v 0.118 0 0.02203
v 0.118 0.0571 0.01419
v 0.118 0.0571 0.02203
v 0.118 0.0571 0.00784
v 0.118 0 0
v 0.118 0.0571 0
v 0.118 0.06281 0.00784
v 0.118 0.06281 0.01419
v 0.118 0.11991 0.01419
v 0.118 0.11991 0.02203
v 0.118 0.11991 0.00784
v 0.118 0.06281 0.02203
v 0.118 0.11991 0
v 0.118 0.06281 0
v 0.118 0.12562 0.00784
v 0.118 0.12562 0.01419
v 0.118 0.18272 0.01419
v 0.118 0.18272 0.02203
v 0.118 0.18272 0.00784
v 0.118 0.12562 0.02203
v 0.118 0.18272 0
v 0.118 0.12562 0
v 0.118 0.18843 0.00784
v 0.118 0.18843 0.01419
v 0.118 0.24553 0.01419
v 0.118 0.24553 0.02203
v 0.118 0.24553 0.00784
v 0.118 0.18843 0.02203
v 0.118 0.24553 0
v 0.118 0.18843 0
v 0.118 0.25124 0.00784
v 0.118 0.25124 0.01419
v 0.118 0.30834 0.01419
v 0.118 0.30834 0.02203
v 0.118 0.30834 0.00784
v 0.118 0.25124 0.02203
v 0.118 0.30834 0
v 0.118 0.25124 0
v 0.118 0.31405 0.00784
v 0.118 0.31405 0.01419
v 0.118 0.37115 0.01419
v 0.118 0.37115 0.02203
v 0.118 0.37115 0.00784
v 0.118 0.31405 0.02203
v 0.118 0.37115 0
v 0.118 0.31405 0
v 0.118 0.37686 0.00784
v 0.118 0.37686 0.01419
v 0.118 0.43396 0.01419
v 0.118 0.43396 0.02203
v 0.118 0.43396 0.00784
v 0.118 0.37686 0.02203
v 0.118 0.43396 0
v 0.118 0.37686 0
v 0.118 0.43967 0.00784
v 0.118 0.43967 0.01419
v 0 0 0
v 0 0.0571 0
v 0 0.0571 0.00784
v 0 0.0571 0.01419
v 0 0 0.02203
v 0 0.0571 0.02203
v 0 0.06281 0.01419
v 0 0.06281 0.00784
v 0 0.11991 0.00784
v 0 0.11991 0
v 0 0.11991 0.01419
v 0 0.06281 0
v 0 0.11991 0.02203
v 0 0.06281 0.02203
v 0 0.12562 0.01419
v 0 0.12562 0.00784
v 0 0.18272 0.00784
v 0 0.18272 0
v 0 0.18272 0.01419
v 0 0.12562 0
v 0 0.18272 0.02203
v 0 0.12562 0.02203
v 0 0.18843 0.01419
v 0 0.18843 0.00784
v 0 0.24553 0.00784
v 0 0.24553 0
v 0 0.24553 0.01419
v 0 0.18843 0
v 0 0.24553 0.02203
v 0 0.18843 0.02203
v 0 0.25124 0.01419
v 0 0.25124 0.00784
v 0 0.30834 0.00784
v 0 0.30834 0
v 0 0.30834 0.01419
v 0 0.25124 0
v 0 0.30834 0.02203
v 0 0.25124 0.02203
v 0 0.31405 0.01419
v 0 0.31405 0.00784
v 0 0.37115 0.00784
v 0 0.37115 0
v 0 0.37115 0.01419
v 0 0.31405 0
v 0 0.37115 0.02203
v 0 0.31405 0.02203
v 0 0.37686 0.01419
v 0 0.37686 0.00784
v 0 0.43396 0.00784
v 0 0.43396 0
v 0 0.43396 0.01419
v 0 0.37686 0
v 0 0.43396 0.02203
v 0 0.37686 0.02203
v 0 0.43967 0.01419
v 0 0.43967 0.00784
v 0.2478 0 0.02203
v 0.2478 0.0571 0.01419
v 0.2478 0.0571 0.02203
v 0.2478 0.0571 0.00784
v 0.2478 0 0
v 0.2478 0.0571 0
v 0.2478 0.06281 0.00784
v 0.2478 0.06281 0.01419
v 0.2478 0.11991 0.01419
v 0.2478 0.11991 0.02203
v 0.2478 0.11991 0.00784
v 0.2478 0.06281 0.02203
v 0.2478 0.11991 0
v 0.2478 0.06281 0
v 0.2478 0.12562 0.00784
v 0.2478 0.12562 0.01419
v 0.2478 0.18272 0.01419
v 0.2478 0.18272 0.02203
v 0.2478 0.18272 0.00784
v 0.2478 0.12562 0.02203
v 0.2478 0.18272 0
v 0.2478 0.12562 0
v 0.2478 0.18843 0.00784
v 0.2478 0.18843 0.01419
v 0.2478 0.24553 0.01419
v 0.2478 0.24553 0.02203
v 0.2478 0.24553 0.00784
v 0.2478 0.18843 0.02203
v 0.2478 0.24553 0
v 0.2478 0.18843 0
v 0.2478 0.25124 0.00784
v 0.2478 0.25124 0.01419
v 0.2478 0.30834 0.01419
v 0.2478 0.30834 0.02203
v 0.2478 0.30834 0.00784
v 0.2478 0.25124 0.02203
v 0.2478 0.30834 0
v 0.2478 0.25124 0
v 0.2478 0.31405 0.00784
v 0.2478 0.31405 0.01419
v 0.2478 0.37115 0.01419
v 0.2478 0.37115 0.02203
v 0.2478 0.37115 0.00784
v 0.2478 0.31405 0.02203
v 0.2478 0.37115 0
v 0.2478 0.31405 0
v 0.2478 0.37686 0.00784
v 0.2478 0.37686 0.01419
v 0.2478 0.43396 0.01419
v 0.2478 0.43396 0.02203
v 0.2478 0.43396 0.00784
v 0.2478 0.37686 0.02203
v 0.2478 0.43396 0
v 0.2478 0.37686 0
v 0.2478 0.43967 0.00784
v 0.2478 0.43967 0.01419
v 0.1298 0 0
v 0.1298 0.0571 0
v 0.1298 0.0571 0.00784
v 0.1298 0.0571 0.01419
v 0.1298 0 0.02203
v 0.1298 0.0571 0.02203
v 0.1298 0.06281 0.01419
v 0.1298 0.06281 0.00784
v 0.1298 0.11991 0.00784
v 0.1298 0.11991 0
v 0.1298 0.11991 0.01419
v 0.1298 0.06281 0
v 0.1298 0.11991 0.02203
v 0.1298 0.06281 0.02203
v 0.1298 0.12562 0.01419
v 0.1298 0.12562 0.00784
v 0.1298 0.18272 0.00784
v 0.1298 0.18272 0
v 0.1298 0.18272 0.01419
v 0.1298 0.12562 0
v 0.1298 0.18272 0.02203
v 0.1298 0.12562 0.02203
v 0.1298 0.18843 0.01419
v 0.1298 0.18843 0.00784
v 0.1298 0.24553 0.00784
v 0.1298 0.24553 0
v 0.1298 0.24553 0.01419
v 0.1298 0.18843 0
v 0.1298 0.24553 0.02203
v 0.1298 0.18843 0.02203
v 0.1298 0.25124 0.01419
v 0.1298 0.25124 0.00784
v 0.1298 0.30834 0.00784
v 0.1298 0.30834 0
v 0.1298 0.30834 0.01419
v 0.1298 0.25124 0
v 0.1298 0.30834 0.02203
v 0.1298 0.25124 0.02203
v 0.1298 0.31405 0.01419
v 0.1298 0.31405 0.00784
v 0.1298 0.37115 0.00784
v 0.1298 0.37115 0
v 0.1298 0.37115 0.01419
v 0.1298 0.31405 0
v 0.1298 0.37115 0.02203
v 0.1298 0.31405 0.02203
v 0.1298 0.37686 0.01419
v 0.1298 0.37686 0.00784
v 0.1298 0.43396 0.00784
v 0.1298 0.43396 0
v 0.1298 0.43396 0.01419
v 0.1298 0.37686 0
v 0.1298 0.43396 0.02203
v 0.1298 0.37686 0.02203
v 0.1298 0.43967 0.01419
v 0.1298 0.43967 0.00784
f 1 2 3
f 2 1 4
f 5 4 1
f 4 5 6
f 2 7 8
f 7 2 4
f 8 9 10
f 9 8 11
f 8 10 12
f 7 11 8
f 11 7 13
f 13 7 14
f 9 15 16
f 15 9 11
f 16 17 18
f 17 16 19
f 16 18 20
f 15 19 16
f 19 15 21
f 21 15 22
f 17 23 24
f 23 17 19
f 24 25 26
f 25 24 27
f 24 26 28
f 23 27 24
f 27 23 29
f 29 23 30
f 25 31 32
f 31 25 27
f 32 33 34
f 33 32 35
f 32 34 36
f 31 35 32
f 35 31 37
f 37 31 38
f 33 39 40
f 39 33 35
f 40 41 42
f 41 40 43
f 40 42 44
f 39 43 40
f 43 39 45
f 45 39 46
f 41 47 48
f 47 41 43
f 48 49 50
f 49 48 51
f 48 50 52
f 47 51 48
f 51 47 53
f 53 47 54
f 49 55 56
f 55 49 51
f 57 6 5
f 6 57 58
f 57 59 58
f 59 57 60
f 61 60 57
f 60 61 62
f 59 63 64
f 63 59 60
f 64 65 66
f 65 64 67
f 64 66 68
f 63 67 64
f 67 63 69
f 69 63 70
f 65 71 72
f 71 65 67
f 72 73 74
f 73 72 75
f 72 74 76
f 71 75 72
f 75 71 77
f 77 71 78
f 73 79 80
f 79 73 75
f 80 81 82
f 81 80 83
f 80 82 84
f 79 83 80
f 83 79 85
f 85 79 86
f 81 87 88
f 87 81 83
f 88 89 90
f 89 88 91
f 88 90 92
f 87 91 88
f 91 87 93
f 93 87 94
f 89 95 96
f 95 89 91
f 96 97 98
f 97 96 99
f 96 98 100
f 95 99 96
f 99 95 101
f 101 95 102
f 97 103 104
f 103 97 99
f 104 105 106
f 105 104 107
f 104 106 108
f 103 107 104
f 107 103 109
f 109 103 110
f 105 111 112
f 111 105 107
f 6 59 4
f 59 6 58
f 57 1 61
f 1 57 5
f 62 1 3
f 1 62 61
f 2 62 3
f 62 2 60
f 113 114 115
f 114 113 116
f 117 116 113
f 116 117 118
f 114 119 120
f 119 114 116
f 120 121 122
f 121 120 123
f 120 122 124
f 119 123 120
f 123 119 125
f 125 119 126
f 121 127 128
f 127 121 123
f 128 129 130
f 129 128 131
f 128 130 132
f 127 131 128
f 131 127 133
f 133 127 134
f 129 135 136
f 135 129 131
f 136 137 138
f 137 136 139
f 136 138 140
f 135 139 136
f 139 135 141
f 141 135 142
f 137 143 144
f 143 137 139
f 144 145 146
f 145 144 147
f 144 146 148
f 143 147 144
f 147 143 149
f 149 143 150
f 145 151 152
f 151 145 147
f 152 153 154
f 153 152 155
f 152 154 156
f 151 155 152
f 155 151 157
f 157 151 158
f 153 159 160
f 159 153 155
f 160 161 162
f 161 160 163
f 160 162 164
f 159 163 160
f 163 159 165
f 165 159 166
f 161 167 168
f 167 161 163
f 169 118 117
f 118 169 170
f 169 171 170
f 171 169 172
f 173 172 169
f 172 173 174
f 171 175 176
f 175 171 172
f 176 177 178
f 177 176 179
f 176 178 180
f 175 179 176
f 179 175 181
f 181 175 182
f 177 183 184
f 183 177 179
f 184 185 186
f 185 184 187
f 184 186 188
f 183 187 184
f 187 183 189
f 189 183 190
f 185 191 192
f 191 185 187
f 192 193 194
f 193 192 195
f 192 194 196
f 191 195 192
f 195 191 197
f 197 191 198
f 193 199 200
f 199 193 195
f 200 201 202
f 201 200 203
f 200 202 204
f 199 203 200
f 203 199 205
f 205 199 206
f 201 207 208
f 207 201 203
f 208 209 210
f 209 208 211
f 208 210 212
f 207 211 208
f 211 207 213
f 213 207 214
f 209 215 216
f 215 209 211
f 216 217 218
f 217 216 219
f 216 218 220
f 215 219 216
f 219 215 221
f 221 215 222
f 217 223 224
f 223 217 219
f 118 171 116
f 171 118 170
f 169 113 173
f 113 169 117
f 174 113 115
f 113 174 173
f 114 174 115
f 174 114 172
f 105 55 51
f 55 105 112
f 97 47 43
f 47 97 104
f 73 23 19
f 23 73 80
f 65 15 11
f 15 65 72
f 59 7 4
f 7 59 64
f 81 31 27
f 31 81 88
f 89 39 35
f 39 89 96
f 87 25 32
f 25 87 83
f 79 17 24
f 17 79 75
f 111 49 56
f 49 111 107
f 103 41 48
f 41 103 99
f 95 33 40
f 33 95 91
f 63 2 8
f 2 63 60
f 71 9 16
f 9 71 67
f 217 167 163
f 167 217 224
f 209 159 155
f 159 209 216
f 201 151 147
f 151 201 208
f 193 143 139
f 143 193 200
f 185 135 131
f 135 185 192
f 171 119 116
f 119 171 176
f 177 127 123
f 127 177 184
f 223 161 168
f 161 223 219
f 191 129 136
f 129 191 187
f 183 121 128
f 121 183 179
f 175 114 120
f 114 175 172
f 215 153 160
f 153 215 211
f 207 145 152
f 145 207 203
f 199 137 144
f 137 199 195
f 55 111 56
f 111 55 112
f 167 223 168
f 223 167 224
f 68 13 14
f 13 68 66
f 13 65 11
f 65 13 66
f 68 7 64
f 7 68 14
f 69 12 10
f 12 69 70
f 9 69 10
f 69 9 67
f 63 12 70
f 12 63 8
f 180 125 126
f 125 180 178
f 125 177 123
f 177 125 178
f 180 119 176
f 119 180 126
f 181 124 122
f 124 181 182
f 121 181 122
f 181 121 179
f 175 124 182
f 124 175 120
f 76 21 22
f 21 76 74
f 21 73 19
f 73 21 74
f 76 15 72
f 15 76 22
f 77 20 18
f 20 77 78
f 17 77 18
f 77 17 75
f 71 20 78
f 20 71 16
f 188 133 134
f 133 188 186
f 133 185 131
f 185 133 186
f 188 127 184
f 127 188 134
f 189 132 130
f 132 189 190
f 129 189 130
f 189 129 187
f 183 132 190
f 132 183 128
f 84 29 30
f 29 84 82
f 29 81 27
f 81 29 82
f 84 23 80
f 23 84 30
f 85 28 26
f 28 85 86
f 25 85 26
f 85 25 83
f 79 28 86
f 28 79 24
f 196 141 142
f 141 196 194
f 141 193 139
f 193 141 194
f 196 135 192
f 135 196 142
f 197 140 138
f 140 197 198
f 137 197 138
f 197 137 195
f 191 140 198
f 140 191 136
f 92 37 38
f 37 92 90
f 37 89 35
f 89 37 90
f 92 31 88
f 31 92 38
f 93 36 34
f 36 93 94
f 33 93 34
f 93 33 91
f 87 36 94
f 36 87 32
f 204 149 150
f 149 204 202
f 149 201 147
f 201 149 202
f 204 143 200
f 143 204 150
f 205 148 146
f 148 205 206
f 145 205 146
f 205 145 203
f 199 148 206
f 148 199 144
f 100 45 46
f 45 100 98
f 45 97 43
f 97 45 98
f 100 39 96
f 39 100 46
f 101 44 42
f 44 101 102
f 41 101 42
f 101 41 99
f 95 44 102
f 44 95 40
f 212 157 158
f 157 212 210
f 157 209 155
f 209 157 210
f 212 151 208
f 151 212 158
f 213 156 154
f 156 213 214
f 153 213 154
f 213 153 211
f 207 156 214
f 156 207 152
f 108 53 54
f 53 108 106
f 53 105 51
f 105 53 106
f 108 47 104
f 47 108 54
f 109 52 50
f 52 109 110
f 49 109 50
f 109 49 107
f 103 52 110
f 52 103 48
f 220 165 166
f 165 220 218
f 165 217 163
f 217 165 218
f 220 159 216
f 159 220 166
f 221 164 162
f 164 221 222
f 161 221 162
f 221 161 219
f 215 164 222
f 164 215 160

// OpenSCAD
union(){
    translate(v=[0.0, 0, 0.0]){
        union(){
            translate(v=[0, 0.0, 0]){
                cube(size=[0.118, 0.0571, 0.00635]);
            };
            translate(v=[0, 0.0, 0.015677317238102034]){
                cube(size=[0.118, 0.0571, 0.00635]);
            };
            translate(v=[0.1298, 0.0, 0]){
                cube(size=[0.118, 0.0571, 0.00635]);
            };
            translate(v=[0.1298, 0.0, 0.015677317238102034]){
                cube(size=[0.118, 0.0571, 0.00635]);
            };
            translate(v=[0, 0.0, 0.00635]){
                color("Orange"){
                    cube(size=[0.118, 0.0571, 0.0014886586190510165]);
                };
            };
            translate(v=[0, 0.0, 0.014188658619051019]){
                color("Orange"){
                    cube(size=[0.118, 0.0571, 0.0014886586190510165]);
                };
            };
            translate(v=[0.1298, 0.0, 0.00635]){
                color("Orange"){
                    cube(size=[0.118, 0.0571, 0.0014886586190510165]);
                };
            };
            translate(v=[0.1298, 0.0, 0.014188658619051019]){
                color("Orange"){
                    cube(size=[0.118, 0.0571, 0.0014886586190510165]);
                };
            };
            translate(v=[0, 0, 0.007838658619051017]){
                color("Gray"){
                    cube(size=[0.118, 0.43967000000000006, 0.00635]);
                };
            };
            translate(v=[0.1298, 0, 0.007838658619051017]){
                color("Gray"){
                    cube(size=[0.118, 0.43967000000000006, 0.00635]);
                };
            };
            difference(){
                translate(v=[0.1239, 0, 0.007838658619051017]){
                    color("Gray"){
                        cylinder(h=0.00635, r=0.1239, $fn=100);
                    };
                };
                translate(v=[0, 0, -0.002161341380948983]){
                    cube(size=[0.2596, 0.1298, 0.02635]);
                };
                translate(v=[0.1239, 0, 0.007838658619051017]){
                    color("Gray"){
                        cylinder(h=0.00635, r=0.1239, $fn=100);
                    };
                };
                translate(v=[0, 0, -0.002161341380948983]){
                    cube(size=[0.2596, 0.1298, 0.02635]);
                };
                translate(v=[0.1239, 0, 0.007838658619051017]){
                    color("Gray"){
                        cylinder(h=0.00635, r=0.1239, $fn=100);
                    };
                };
                translate(v=[0, 0, -0.002161341380948983]){
                    cube(size=[0.2596, 0.1298, 0.02635]);
                };
                translate(v=[0.1239, 0, 0.007838658619051017]){
                    color("Gray"){
                        cylinder(h=0.00635, r=0.1239, $fn=100);
                    };
                };
                translate(v=[0, 0, -0.002161341380948983]){
                    cube(size=[0.2596, 0.1298, 0.02635]);
                };
                translate(v=[0.1239, 0, 0.007838658619051017]){
                    color("Gray"){
                        cylinder(h=0.00635, r=0.1239, $fn=100);
                    };
                };
                translate(v=[0, 0, -0.002161341380948983]){
                    cube(size=[0.2596, 0.1298, 0.02635]);
                };
                translate(v=[0.1239, 0, 0.007838658619051017]){
                    color("Gray"){
                        cylinder(h=0.00635, r=0.1239, $fn=100);
                    };
                };
                translate(v=[0, 0, -0.002161341380948983]){
                    cube(size=[0.2596, 0.1298, 0.02635]);
                };
                translate(v=[0.1239, 0, 0.007838658619051017]){
                    color("Gray"){
                        cylinder(h=0.00635, r=0.1239, $fn=100);
                    };
                };
                translate(v=[0, 0, -0.002161341380948983]){
                    cube(size=[0.2596, 0.1298, 0.02635]);
                };
            };
            translate(v=[0, 0.06281, 0]){
                cube(size=[0.118, 0.0571, 0.00635]);
            };
            translate(v=[0, 0.06281, 0.015677317238102034]){
                cube(size=[0.118, 0.0571, 0.00635]);
            };
            translate(v=[0.1298, 0.06281, 0]){
                cube(size=[0.118, 0.0571, 0.00635]);
            };
            translate(v=[0.1298, 0.06281, 0.015677317238102034]){
                cube(size=[0.118, 0.0571, 0.00635]);
            };
            translate(v=[0, 0.06281, 0.00635]){
                color("Orange"){
                    cube(size=[0.118, 0.0571, 0.0014886586190510165]);
                };
            };
            translate(v=[0, 0.06281, 0.014188658619051019]){
                color("Orange"){
                    cube(size=[0.118, 0.0571, 0.0014886586190510165]);
                };
            };
            translate(v=[0.1298, 0.06281, 0.00635]){
                color("Orange"){
                    cube(size=[0.118, 0.0571, 0.0014886586190510165]);
                };
            };
            translate(v=[0.1298, 0.06281, 0.014188658619051019]){
                color("Orange"){
                    cube(size=[0.118, 0.0571, 0.0014886586190510165]);
                };
            };
            translate(v=[0, 0, 0.007838658619051017]){
                color("Gray"){
                    cube(size=[0.118, 0.43967000000000006, 0.00635]);
                };
            };
            translate(v=[0.1298, 0, 0.007838658619051017]){
                color("Gray"){
                    cube(size=[0.118, 0.43967000000000006, 0.00635]);
                };
            };
            difference(){
                translate(v=[0.1239, 0, 0.007838658619051017]){
                    color("Gray"){
                        cylinder(h=0.00635, r=0.1239, $fn=100);
                    };
                };
                translate(v=[0, 0, -0.002161341380948983]){
                    cube(size=[0.2596, 0.1298, 0.02635]);
                };
                translate(v=[0.1239, 0, 0.007838658619051017]){
                    color("Gray"){
                        cylinder(h=0.00635, r=0.1239, $fn=100);
                    };
                };
                translate(v=[0, 0, -0.002161341380948983]){
                    cube(size=[0.2596, 0.1298, 0.02635]);
                };
                translate(v=[0.1239, 0, 0.007838658619051017]){
                    color("Gray"){
                        cylinder(h=0.00635, r=0.1239, $fn=100);
                    };
                };
                translate(v=[0, 0, -0.002161341380948983]){
                    cube(size=[0.2596, 0.1298, 0.02635]);
                };
                translate(v=[0.1239, 0, 0.007838658619051017]){
                    color("Gray"){
                        cylinder(h=0.00635, r=0.1239, $fn=100);
                    };
                };
                translate(v=[0, 0, -0.002161341380948983]){
                    cube(size=[0.2596, 0.1298, 0.02635]);
                };
                translate(v=[0.1239, 0, 0.007838658619051017]){
                    color("Gray"){
                        cylinder(h=0.00635, r=0.1239, $fn=100);
                    };
                };
                translate(v=[0, 0, -0.002161341380948983]){
                    cube(size=[0.2596, 0.1298, 0.02635]);
                };
                translate(v=[0.1239, 0, 0.007838658619051017]){
                    color("Gray"){
                        cylinder(h=0.00635, r=0.1239, $fn=100);
                    };
                };
                translate(v=[0, 0, -0.002161341380948983]){
                    cube(size=[0.2596, 0.1298, 0.02635]);
                };
                translate(v=[0.1239, 0, 0.007838658619051017]){
                    color("Gray"){
                        cylinder(h=0.00635, r=0.1239, $fn=100);
                    };
                };
                translate(v=[0, 0, -0.002161341380948983]){
                    cube(size=[0.2596, 0.1298, 0.02635]);
                };
            };
            translate(v=[0, 0.12562, 0]){
                cube(size=[0.118, 0.0571, 0.00635]);
            };
            translate(v=[0, 0.12562, 0.015677317238102034]){
                cube(size=[0.118, 0.0571, 0.00635]);
            };
            translate(v=[0.1298, 0.12562, 0]){
                cube(size=[0.118, 0.0571, 0.00635]);
            };
            translate(v=[0.1298, 0.12562, 0.015677317238102034]){
                cube(size=[0.118, 0.0571, 0.00635]);
            };
            translate(v=[0, 0.12562, 0.00635]){
                color("Orange"){
                    cube(size=[0.118, 0.0571, 0.0014886586190510165]);
                };
            };
            translate(v=[0, 0.12562, 0.014188658619051019]){
                color("Orange"){
                    cube(size=[0.118, 0.0571, 0.0014886586190510165]);
                };
            };
            translate(v=[0.1298, 0.12562, 0.00635]){
                color("Orange"){
                    cube(size=[0.118, 0.0571, 0.0014886586190510165]);
                };
            };
            translate(v=[0.1298, 0.12562, 0.014188658619051019]){
                color("Orange"){
                    cube(size=[0.118, 0.0571, 0.0014886586190510165]);
                };
            };
            translate(v=[0, 0, 0.007838658619051017]){
                color("Gray"){
                    cube(size=[0.118, 0.43967000000000006, 0.00635]);
                };
            };
            translate(v=[0.1298, 0, 0.007838658619051017]){
                color("Gray"){
                    cube(size=[0.118, 0.43967000000000006, 0.00635]);
                };
            };
            difference(){
                translate(v=[0.1239, 0, 0.007838658619051017]){
                    color("Gray"){
                        cylinder(h=0.00635, r=0.1239, $fn=100);
                    };
                };
                translate(v=[0, 0, -0.002161341380948983]){
                    cube(size=[0.2596, 0.1298, 0.02635]);
                };
                translate(v=[0.1239, 0, 0.007838658619051017]){
                    color("Gray"){
                        cylinder(h=0.00635, r=0.1239, $fn=100);
                    };
                };
                translate(v=[0, 0, -0.002161341380948983]){
                    cube(size=[0.2596, 0.1298, 0.02635]);
                };
                translate(v=[0.1239, 0, 0.007838658619051017]){
                    color("Gray"){
                        cylinder(h=0.00635, r=0.1239, $fn=100);
                    };
                };
                translate(v=[0, 0, -0.002161341380948983]){
                    cube(size=[0.2596, 0.1298, 0.02635]);
                };
                translate(v=[0.1239, 0, 0.007838658619051017]){
                    color("Gray"){
                        cylinder(h=0.00635, r=0.1239, $fn=100);
                    };
                };
                translate(v=[0, 0, -0.002161341380948983]){
                    cube(size=[0.2596, 0.1298, 0.02635]);
                };
                translate(v=[0.1239, 0, 0.007838658619051017]){
                    color("Gray"){
                        cylinder(h=0.00635, r=0.1239, $fn=100);
                    };
                };
                translate(v=[0, 0, -0.002161341380948983]){
                    cube(size=[0.2596, 0.1298, 0.02635]);
                };
                translate(v=[0.1239, 0, 0.007838658619051017]){
                    color("Gray"){
                        cylinder(h=0.00635, r=0.1239, $fn=100);
                    };
                };
                translate(v=[0, 0, -0.002161341380948983]){
                    cube(size=[0.2596, 0.1298, 0.02635]);
                };
                translate(v=[0.1239, 0, 0.007838658619051017]){
                    color("Gray"){
                        cylinder(h=0.00635, r=0.1239, $fn=100);
                    };
                };
                translate(v=[0, 0, -0.002161341380948983]){
                    cube(size=[0.2596, 0.1298, 0.02635]);
                };
            };
            translate(v=[0, 0.18843000000000001, 0]){
                cube(size=[0.118, 0.0571, 0.00635]);
            };
            translate(v=[0, 0.18843000000000001, 0.015677317238102034]){
                cube(size=[0.118, 0.0571, 0.00635]);
            };
            translate(v=[0.1298, 0.18843000000000001, 0]){
                cube(size=[0.118, 0.0571, 0.00635]);
            };
            translate(v=[0.1298, 0.18843000000000001, 0.015677317238102034]){
                cube(size=[0.118, 0.0571, 0.00635]);
            };
            translate(v=[0, 0.18843000000000001, 0.00635]){
                color("Orange"){
                    cube(size=[0.118, 0.0571, 0.0014886586190510165]);
                };
            };
            translate(v=[0, 0.18843000000000001, 0.014188658619051019]){
                color("Orange"){
                    cube(size=[0.118, 0.0571, 0.0014886586190510165]);
                };
            };
            translate(v=[0.1298, 0.18843000000000001, 0.00635]){
                color("Orange"){
                    cube(size=[0.118, 0.0571, 0.0014886586190510165]);
                };
            };
            translate(v=[0.1298, 0.18843000000000001, 0.014188658619051019]){
                color("Orange"){
                    cube(size=[0.118, 0.0571, 0.0014886586190510165]);
                };
            };
            translate(v=[0, 0, 0.007838658619051017]){
                color("Gray"){
                    cube(size=[0.118, 0.43967000000000006, 0.00635]);
                };
            };
            translate(v=[0.1298, 0, 0.007838658619051017]){
                color("Gray"){
                    cube(size=[0.118, 0.43967000000000006, 0.00635]);
                };
            };
            difference(){
                translate(v=[0.1239, 0, 0.007838658619051017]){
                    color("Gray"){
                        cylinder(h=0.00635, r=0.1239, $fn=100);
                    };
                };
                translate(v=[0, 0, -0.002161341380948983]){
                    cube(size=[0.2596, 0.1298, 0.02635]);
                };
                translate(v=[0.1239, 0, 0.007838658619051017]){
                    color("Gray"){
                        cylinder(h=0.00635, r=0.1239, $fn=100);
                    };
                };
                translate(v=[0, 0, -0.002161341380948983]){
                    cube(size=[0.2596, 0.1298, 0.02635]);
                };
                translate(v=[0.1239, 0, 0.007838658619051017]){
                    color("Gray"){
                        cylinder(h=0.00635, r=0.1239, $fn=100);
                    };
                };
                translate(v=[0, 0, -0.002161341380948983]){
                    cube(size=[0.2596, 0.1298, 0.02635]);
                };
                translate(v=[0.1239, 0, 0.007838658619051017]){
                    color("Gray"){
                        cylinder(h=0.00635, r=0.1239, $fn=100);
                    };
                };
                translate(v=[0, 0, -0.002161341380948983]){
                    cube(size=[0.2596, 0.1298, 0.02635]);
                };
                translate(v=[0.1239, 0, 0.007838658619051017]){
                    color("Gray"){
                        cylinder(h=0.00635, r=0.1239, $fn=100);
                    };
                };
                translate(v=[0, 0, -0.002161341380948983]){
                    cube(size=[0.2596, 0.1298, 0.02635]);
                };
                translate(v=[0.1239, 0, 0.007838658619051017]){
                    color("Gray"){
                        cylinder(h=0.00635, r=0.1239, $fn=100);
                    };
                };
                translate(v=[0, 0, -0.002161341380948983]){
                    cube(size=[0.2596, 0.1298, 0.02635]);
                };
                translate(v=[0.1239, 0, 0.007838658619051017]){
                    color("Gray"){
                        cylinder(h=0.00635, r=0.1239, $fn=100);
                    };
                };
                translate(v=[0, 0, -0.002161341380948983]){
                    cube(size=[0.2596, 0.1298, 0.02635]);
                };
            };
            translate(v=[0, 0.25124, 0]){
                cube(size=[0.118, 0.0571, 0.00635]);
            };
            translate(v=[0, 0.25124, 0.015677317238102034]){
                cube(size=[0.118, 0.0571, 0.00635]);
            };
            translate(v=[0.1298, 0.25124, 0]){
                cube(size=[0.118, 0.0571, 0.00635]);
            };
            translate(v=[0.1298, 0.25124, 0.015677317238102034]){
                cube(size=[0.118, 0.0571, 0.00635]);
            };
            translate(v=[0, 0.25124, 0.00635]){
                color("Orange"){
                    cube(size=[0.118, 0.0571, 0.0014886586190510165]);
                };
            };
            translate(v=[0, 0.25124, 0.014188658619051019]){
                color("Orange"){
                    cube(size=[0.118, 0.0571, 0.0014886586190510165]);
                };
            };
            translate(v=[0.1298, 0.25124, 0.00635]){
                color("Orange"){
                    cube(size=[0.118, 0.0571, 0.0014886586190510165]);
                };
            };
            translate(v=[0.1298, 0.25124, 0.014188658619051019]){
                color("Orange"){
                    cube(size=[0.118, 0.0571, 0.0014886586190510165]);
                };
            };
            translate(v=[0, 0, 0.007838658619051017]){
                color("Gray"){
                    cube(size=[0.118, 0.43967000000000006, 0.00635]);
                };
            };
            translate(v=[0.1298, 0, 0.007838658619051017]){
                color("Gray"){
                    cube(size=[0.118, 0.43967000000000006, 0.00635]);
                };
            };
            difference(){
                translate(v=[0.1239, 0, 0.007838658619051017]){
                    color("Gray"){
                        cylinder(h=0.00635, r=0.1239, $fn=100);
                    };
                };
                translate(v=[0, 0, -0.002161341380948983]){
                    cube(size=[0.2596, 0.1298, 0.02635]);
                };
                translate(v=[0.1239, 0, 0.007838658619051017]){
                    color("Gray"){
                        cylinder(h=0.00635, r=0.1239, $fn=100);
                    };
                };
                translate(v=[0, 0, -0.002161341380948983]){
                    cube(size=[0.2596, 0.1298, 0.02635]);
                };
                translate(v=[0.1239, 0, 0.007838658619051017]){
                    color("Gray"){
                        cylinder(h=0.00635, r=0.1239, $fn=100);
                    };
                };
                translate(v=[0, 0, -0.002161341380948983]){
                    cube(size=[0.2596, 0.1298, 0.02635]);
                };
                translate(v=[0.1239, 0, 0.007838658619051017]){
                    color("Gray"){
                        cylinder(h=0.00635, r=0.1239, $fn=100);
                    };
                };
                translate(v=[0, 0, -0.002161341380948983]){
                    cube(size=[0.2596, 0.1298, 0.02635]);
                };
                translate(v=[0.1239, 0, 0.007838658619051017]){
                    color("Gray"){
                        cylinder(h=0.00635, r=0.1239, $fn=100);
                    };
                };
                translate(v=[0, 0, -0.002161341380948983]){
                    cube(size=[0.2596, 0.1298, 0.02635]);
                };
                translate(v=[0.1239, 0, 0.007838658619051017]){
                    color("Gray"){
                        cylinder(h=0.00635, r=0.1239, $fn=100);
                    };
                };
                translate(v=[0, 0, -0.002161341380948983]){
                    cube(size=[0.2596, 0.1298, 0.02635]);
                };
                translate(v=[0.1239, 0, 0.007838658619051017]){
                    color("Gray"){
                        cylinder(h=0.00635, r=0.1239, $fn=100);
                    };
                };
                translate(v=[0, 0, -0.002161341380948983]){
                    cube(size=[0.2596, 0.1298, 0.02635]);
                };
            };
            translate(v=[0, 0.31405000000000005, 0]){
                cube(size=[0.118, 0.0571, 0.00635]);
            };
            translate(v=[0, 0.31405000000000005, 0.015677317238102034]){
                cube(size=[0.118, 0.0571, 0.00635]);
            };
            translate(v=[0.1298, 0.31405000000000005, 0]){
                cube(size=[0.118, 0.0571, 0.00635]);
            };
            translate(v=[0.1298, 0.31405000000000005, 0.015677317238102034]){
                cube(size=[0.118, 0.0571, 0.00635]);
            };
            translate(v=[0, 0.31405000000000005, 0.00635]){
                color("Orange"){
                    cube(size=[0.118, 0.0571, 0.0014886586190510165]);
                };
            };
            translate(v=[0, 0.31405000000000005, 0.014188658619051019]){
                color("Orange"){
                    cube(size=[0.118, 0.0571, 0.0014886586190510165]);
                };
            };
            translate(v=[0.1298, 0.31405000000000005, 0.00635]){
                color("Orange"){
                    cube(size=[0.118, 0.0571, 0.0014886586190510165]);
                };
            };
            translate(v=[0.1298, 0.31405000000000005, 0.014188658619051019]){
                color("Orange"){
                    cube(size=[0.118, 0.0571, 0.0014886586190510165]);
                };
            };
            translate(v=[0, 0, 0.007838658619051017]){
                color("Gray"){
                    cube(size=[0.118, 0.43967000000000006, 0.00635]);
                };
            };
            translate(v=[0.1298, 0, 0.007838658619051017]){
                color("Gray"){
                    cube(size=[0.118, 0.43967000000000006, 0.00635]);
                };
            };
            difference(){
                translate(v=[0.1239, 0, 0.007838658619051017]){
                    color("Gray"){
                        cylinder(h=0.00635, r=0.1239, $fn=100);
                    };
                };
                translate(v=[0, 0, -0.002161341380948983]){
                    cube(size=[0.2596, 0.1298, 0.02635]);
                };
                translate(v=[0.1239, 0, 0.007838658619051017]){
                    color("Gray"){
                        cylinder(h=0.00635, r=0.1239, $fn=100);
                    };
                };
                translate(v=[0, 0, -0.002161341380948983]){
                    cube(size=[0.2596, 0.1298, 0.02635]);
                };
                translate(v=[0.1239, 0, 0.007838658619051017]){
                    color("Gray"){
                        cylinder(h=0.00635, r=0.1239, $fn=100);
                    };
                };
                translate(v=[0, 0, -0.002161341380948983]){
                    cube(size=[0.2596, 0.1298, 0.02635]);
                };
                translate(v=[0.1239, 0, 0.007838658619051017]){
                    color("Gray"){
                        cylinder(h=0.00635, r=0.1239, $fn=100);
                    };
                };
                translate(v=[0, 0, -0.002161341380948983]){
                    cube(size=[0.2596, 0.1298, 0.02635]);
                };
                translate(v=[0.1239, 0, 0.007838658619051017]){
                    color("Gray"){
                        cylinder(h=0.00635, r=0.1239, $fn=100);
                    };
                };
                translate(v=[0, 0, -0.002161341380948983]){
                    cube(size=[0.2596, 0.1298, 0.02635]);
                };
                translate(v=[0.1239, 0, 0.007838658619051017]){
                    color("Gray"){
                        cylinder(h=0.00635, r=0.1239, $fn=100);
                    };
                };
                translate(v=[0, 0, -0.002161341380948983]){
                    cube(size=[0.2596, 0.1298, 0.02635]);
                };
                translate(v=[0.1239, 0, 0.007838658619051017]){
                    color("Gray"){
                        cylinder(h=0.00635, r=0.1239, $fn=100);
                    };
                };
                translate(v=[0, 0, -0.002161341380948983]){
                    cube(size=[0.2596, 0.1298, 0.02635]);
                };
            };
            translate(v=[0, 0.37686000000000003, 0]){
                cube(size=[0.118, 0.0571, 0.00635]);
            };
            translate(v=[0, 0.37686000000000003, 0.015677317238102034]){
                cube(size=[0.118, 0.0571, 0.00635]);
            };
            translate(v=[0.1298, 0.37686000000000003, 0]){
                cube(size=[0.118, 0.0571, 0.00635]);
            };
            translate(v=[0.1298, 0.37686000000000003, 0.015677317238102034]){
                cube(size=[0.118, 0.0571, 0.00635]);
            };
            translate(v=[0, 0.37686000000000003, 0.00635]){
                color("Orange"){
                    cube(size=[0.118, 0.0571, 0.0014886586190510165]);
                };
            };
            translate(v=[0, 0.37686000000000003, 0.014188658619051019]){
                color("Orange"){
                    cube(size=[0.118, 0.0571, 0.0014886586190510165]);
                };
            };
            translate(v=[0.1298, 0.37686000000000003, 0.00635]){
                color("Orange"){
                    cube(size=[0.118, 0.0571, 0.0014886586190510165]);
                };
            };
            translate(v=[0.1298, 0.37686000000000003, 0.014188658619051019]){
                color("Orange"){
                    cube(size=[0.118, 0.0571, 0.0014886586190510165]);
                };
            };
            translate(v=[0, 0, 0.007838658619051017]){
                color("Gray"){
                    cube(size=[0.118, 0.43967000000000006, 0.00635]);
                };
            };
            translate(v=[0.1298, 0, 0.007838658619051017]){
                color("Gray"){
                    cube(size=[0.118, 0.43967000000000006, 0.00635]);
                };
            };
            difference(){
                translate(v=[0.1239, 0, 0.007838658619051017]){
                    color("Gray"){
                        cylinder(h=0.00635, r=0.1239, $fn=100);
                    };
                };
                translate(v=[0, 0, -0.002161341380948983]){
                    cube(size=[0.2596, 0.1298, 0.02635]);
                };
                translate(v=[0.1239, 0, 0.007838658619051017]){
                    color("Gray"){
                        cylinder(h=0.00635, r=0.1239, $fn=100);
                    };
                };
                translate(v=[0, 0, -0.002161341380948983]){
                    cube(size=[0.2596, 0.1298, 0.02635]);
                };
                translate(v=[0.1239, 0, 0.007838658619051017]){
                    color("Gray"){
                        cylinder(h=0.00635, r=0.1239, $fn=100);
                    };
                };
                translate(v=[0, 0, -0.002161341380948983]){
                    cube(size=[0.2596, 0.1298, 0.02635]);
                };
                translate(v=[0.1239, 0, 0.007838658619051017]){
                    color("Gray"){
                        cylinder(h=0.00635, r=0.1239, $fn=100);
                    };
                };
                translate(v=[0, 0, -0.002161341380948983]){
                    cube(size=[0.2596, 0.1298, 0.02635]);
                };
                translate(v=[0.1239, 0, 0.007838658619051017]){
                    color("Gray"){
                        cylinder(h=0.00635, r=0.1239, $fn=100);
                    };
                };
                translate(v=[0, 0, -0.002161341380948983]){
                    cube(size=[0.2596, 0.1298, 0.02635]);
                };
                translate(v=[0.1239, 0, 0.007838658619051017]){
                    color("Gray"){
                        cylinder(h=0.00635, r=0.1239, $fn=100);
                    };
                };
                translate(v=[0, 0, -0.002161341380948983]){
                    cube(size=[0.2596, 0.1298, 0.02635]);
                };
                translate(v=[0.1239, 0, 0.007838658619051017]){
                    color("Gray"){
                        cylinder(h=0.00635, r=0.1239, $fn=100);
                    };
                };
                translate(v=[0, 0, -0.002161341380948983]){
                    cube(size=[0.2596, 0.1298, 0.02635]);
                };
            };
        };
    };
};
